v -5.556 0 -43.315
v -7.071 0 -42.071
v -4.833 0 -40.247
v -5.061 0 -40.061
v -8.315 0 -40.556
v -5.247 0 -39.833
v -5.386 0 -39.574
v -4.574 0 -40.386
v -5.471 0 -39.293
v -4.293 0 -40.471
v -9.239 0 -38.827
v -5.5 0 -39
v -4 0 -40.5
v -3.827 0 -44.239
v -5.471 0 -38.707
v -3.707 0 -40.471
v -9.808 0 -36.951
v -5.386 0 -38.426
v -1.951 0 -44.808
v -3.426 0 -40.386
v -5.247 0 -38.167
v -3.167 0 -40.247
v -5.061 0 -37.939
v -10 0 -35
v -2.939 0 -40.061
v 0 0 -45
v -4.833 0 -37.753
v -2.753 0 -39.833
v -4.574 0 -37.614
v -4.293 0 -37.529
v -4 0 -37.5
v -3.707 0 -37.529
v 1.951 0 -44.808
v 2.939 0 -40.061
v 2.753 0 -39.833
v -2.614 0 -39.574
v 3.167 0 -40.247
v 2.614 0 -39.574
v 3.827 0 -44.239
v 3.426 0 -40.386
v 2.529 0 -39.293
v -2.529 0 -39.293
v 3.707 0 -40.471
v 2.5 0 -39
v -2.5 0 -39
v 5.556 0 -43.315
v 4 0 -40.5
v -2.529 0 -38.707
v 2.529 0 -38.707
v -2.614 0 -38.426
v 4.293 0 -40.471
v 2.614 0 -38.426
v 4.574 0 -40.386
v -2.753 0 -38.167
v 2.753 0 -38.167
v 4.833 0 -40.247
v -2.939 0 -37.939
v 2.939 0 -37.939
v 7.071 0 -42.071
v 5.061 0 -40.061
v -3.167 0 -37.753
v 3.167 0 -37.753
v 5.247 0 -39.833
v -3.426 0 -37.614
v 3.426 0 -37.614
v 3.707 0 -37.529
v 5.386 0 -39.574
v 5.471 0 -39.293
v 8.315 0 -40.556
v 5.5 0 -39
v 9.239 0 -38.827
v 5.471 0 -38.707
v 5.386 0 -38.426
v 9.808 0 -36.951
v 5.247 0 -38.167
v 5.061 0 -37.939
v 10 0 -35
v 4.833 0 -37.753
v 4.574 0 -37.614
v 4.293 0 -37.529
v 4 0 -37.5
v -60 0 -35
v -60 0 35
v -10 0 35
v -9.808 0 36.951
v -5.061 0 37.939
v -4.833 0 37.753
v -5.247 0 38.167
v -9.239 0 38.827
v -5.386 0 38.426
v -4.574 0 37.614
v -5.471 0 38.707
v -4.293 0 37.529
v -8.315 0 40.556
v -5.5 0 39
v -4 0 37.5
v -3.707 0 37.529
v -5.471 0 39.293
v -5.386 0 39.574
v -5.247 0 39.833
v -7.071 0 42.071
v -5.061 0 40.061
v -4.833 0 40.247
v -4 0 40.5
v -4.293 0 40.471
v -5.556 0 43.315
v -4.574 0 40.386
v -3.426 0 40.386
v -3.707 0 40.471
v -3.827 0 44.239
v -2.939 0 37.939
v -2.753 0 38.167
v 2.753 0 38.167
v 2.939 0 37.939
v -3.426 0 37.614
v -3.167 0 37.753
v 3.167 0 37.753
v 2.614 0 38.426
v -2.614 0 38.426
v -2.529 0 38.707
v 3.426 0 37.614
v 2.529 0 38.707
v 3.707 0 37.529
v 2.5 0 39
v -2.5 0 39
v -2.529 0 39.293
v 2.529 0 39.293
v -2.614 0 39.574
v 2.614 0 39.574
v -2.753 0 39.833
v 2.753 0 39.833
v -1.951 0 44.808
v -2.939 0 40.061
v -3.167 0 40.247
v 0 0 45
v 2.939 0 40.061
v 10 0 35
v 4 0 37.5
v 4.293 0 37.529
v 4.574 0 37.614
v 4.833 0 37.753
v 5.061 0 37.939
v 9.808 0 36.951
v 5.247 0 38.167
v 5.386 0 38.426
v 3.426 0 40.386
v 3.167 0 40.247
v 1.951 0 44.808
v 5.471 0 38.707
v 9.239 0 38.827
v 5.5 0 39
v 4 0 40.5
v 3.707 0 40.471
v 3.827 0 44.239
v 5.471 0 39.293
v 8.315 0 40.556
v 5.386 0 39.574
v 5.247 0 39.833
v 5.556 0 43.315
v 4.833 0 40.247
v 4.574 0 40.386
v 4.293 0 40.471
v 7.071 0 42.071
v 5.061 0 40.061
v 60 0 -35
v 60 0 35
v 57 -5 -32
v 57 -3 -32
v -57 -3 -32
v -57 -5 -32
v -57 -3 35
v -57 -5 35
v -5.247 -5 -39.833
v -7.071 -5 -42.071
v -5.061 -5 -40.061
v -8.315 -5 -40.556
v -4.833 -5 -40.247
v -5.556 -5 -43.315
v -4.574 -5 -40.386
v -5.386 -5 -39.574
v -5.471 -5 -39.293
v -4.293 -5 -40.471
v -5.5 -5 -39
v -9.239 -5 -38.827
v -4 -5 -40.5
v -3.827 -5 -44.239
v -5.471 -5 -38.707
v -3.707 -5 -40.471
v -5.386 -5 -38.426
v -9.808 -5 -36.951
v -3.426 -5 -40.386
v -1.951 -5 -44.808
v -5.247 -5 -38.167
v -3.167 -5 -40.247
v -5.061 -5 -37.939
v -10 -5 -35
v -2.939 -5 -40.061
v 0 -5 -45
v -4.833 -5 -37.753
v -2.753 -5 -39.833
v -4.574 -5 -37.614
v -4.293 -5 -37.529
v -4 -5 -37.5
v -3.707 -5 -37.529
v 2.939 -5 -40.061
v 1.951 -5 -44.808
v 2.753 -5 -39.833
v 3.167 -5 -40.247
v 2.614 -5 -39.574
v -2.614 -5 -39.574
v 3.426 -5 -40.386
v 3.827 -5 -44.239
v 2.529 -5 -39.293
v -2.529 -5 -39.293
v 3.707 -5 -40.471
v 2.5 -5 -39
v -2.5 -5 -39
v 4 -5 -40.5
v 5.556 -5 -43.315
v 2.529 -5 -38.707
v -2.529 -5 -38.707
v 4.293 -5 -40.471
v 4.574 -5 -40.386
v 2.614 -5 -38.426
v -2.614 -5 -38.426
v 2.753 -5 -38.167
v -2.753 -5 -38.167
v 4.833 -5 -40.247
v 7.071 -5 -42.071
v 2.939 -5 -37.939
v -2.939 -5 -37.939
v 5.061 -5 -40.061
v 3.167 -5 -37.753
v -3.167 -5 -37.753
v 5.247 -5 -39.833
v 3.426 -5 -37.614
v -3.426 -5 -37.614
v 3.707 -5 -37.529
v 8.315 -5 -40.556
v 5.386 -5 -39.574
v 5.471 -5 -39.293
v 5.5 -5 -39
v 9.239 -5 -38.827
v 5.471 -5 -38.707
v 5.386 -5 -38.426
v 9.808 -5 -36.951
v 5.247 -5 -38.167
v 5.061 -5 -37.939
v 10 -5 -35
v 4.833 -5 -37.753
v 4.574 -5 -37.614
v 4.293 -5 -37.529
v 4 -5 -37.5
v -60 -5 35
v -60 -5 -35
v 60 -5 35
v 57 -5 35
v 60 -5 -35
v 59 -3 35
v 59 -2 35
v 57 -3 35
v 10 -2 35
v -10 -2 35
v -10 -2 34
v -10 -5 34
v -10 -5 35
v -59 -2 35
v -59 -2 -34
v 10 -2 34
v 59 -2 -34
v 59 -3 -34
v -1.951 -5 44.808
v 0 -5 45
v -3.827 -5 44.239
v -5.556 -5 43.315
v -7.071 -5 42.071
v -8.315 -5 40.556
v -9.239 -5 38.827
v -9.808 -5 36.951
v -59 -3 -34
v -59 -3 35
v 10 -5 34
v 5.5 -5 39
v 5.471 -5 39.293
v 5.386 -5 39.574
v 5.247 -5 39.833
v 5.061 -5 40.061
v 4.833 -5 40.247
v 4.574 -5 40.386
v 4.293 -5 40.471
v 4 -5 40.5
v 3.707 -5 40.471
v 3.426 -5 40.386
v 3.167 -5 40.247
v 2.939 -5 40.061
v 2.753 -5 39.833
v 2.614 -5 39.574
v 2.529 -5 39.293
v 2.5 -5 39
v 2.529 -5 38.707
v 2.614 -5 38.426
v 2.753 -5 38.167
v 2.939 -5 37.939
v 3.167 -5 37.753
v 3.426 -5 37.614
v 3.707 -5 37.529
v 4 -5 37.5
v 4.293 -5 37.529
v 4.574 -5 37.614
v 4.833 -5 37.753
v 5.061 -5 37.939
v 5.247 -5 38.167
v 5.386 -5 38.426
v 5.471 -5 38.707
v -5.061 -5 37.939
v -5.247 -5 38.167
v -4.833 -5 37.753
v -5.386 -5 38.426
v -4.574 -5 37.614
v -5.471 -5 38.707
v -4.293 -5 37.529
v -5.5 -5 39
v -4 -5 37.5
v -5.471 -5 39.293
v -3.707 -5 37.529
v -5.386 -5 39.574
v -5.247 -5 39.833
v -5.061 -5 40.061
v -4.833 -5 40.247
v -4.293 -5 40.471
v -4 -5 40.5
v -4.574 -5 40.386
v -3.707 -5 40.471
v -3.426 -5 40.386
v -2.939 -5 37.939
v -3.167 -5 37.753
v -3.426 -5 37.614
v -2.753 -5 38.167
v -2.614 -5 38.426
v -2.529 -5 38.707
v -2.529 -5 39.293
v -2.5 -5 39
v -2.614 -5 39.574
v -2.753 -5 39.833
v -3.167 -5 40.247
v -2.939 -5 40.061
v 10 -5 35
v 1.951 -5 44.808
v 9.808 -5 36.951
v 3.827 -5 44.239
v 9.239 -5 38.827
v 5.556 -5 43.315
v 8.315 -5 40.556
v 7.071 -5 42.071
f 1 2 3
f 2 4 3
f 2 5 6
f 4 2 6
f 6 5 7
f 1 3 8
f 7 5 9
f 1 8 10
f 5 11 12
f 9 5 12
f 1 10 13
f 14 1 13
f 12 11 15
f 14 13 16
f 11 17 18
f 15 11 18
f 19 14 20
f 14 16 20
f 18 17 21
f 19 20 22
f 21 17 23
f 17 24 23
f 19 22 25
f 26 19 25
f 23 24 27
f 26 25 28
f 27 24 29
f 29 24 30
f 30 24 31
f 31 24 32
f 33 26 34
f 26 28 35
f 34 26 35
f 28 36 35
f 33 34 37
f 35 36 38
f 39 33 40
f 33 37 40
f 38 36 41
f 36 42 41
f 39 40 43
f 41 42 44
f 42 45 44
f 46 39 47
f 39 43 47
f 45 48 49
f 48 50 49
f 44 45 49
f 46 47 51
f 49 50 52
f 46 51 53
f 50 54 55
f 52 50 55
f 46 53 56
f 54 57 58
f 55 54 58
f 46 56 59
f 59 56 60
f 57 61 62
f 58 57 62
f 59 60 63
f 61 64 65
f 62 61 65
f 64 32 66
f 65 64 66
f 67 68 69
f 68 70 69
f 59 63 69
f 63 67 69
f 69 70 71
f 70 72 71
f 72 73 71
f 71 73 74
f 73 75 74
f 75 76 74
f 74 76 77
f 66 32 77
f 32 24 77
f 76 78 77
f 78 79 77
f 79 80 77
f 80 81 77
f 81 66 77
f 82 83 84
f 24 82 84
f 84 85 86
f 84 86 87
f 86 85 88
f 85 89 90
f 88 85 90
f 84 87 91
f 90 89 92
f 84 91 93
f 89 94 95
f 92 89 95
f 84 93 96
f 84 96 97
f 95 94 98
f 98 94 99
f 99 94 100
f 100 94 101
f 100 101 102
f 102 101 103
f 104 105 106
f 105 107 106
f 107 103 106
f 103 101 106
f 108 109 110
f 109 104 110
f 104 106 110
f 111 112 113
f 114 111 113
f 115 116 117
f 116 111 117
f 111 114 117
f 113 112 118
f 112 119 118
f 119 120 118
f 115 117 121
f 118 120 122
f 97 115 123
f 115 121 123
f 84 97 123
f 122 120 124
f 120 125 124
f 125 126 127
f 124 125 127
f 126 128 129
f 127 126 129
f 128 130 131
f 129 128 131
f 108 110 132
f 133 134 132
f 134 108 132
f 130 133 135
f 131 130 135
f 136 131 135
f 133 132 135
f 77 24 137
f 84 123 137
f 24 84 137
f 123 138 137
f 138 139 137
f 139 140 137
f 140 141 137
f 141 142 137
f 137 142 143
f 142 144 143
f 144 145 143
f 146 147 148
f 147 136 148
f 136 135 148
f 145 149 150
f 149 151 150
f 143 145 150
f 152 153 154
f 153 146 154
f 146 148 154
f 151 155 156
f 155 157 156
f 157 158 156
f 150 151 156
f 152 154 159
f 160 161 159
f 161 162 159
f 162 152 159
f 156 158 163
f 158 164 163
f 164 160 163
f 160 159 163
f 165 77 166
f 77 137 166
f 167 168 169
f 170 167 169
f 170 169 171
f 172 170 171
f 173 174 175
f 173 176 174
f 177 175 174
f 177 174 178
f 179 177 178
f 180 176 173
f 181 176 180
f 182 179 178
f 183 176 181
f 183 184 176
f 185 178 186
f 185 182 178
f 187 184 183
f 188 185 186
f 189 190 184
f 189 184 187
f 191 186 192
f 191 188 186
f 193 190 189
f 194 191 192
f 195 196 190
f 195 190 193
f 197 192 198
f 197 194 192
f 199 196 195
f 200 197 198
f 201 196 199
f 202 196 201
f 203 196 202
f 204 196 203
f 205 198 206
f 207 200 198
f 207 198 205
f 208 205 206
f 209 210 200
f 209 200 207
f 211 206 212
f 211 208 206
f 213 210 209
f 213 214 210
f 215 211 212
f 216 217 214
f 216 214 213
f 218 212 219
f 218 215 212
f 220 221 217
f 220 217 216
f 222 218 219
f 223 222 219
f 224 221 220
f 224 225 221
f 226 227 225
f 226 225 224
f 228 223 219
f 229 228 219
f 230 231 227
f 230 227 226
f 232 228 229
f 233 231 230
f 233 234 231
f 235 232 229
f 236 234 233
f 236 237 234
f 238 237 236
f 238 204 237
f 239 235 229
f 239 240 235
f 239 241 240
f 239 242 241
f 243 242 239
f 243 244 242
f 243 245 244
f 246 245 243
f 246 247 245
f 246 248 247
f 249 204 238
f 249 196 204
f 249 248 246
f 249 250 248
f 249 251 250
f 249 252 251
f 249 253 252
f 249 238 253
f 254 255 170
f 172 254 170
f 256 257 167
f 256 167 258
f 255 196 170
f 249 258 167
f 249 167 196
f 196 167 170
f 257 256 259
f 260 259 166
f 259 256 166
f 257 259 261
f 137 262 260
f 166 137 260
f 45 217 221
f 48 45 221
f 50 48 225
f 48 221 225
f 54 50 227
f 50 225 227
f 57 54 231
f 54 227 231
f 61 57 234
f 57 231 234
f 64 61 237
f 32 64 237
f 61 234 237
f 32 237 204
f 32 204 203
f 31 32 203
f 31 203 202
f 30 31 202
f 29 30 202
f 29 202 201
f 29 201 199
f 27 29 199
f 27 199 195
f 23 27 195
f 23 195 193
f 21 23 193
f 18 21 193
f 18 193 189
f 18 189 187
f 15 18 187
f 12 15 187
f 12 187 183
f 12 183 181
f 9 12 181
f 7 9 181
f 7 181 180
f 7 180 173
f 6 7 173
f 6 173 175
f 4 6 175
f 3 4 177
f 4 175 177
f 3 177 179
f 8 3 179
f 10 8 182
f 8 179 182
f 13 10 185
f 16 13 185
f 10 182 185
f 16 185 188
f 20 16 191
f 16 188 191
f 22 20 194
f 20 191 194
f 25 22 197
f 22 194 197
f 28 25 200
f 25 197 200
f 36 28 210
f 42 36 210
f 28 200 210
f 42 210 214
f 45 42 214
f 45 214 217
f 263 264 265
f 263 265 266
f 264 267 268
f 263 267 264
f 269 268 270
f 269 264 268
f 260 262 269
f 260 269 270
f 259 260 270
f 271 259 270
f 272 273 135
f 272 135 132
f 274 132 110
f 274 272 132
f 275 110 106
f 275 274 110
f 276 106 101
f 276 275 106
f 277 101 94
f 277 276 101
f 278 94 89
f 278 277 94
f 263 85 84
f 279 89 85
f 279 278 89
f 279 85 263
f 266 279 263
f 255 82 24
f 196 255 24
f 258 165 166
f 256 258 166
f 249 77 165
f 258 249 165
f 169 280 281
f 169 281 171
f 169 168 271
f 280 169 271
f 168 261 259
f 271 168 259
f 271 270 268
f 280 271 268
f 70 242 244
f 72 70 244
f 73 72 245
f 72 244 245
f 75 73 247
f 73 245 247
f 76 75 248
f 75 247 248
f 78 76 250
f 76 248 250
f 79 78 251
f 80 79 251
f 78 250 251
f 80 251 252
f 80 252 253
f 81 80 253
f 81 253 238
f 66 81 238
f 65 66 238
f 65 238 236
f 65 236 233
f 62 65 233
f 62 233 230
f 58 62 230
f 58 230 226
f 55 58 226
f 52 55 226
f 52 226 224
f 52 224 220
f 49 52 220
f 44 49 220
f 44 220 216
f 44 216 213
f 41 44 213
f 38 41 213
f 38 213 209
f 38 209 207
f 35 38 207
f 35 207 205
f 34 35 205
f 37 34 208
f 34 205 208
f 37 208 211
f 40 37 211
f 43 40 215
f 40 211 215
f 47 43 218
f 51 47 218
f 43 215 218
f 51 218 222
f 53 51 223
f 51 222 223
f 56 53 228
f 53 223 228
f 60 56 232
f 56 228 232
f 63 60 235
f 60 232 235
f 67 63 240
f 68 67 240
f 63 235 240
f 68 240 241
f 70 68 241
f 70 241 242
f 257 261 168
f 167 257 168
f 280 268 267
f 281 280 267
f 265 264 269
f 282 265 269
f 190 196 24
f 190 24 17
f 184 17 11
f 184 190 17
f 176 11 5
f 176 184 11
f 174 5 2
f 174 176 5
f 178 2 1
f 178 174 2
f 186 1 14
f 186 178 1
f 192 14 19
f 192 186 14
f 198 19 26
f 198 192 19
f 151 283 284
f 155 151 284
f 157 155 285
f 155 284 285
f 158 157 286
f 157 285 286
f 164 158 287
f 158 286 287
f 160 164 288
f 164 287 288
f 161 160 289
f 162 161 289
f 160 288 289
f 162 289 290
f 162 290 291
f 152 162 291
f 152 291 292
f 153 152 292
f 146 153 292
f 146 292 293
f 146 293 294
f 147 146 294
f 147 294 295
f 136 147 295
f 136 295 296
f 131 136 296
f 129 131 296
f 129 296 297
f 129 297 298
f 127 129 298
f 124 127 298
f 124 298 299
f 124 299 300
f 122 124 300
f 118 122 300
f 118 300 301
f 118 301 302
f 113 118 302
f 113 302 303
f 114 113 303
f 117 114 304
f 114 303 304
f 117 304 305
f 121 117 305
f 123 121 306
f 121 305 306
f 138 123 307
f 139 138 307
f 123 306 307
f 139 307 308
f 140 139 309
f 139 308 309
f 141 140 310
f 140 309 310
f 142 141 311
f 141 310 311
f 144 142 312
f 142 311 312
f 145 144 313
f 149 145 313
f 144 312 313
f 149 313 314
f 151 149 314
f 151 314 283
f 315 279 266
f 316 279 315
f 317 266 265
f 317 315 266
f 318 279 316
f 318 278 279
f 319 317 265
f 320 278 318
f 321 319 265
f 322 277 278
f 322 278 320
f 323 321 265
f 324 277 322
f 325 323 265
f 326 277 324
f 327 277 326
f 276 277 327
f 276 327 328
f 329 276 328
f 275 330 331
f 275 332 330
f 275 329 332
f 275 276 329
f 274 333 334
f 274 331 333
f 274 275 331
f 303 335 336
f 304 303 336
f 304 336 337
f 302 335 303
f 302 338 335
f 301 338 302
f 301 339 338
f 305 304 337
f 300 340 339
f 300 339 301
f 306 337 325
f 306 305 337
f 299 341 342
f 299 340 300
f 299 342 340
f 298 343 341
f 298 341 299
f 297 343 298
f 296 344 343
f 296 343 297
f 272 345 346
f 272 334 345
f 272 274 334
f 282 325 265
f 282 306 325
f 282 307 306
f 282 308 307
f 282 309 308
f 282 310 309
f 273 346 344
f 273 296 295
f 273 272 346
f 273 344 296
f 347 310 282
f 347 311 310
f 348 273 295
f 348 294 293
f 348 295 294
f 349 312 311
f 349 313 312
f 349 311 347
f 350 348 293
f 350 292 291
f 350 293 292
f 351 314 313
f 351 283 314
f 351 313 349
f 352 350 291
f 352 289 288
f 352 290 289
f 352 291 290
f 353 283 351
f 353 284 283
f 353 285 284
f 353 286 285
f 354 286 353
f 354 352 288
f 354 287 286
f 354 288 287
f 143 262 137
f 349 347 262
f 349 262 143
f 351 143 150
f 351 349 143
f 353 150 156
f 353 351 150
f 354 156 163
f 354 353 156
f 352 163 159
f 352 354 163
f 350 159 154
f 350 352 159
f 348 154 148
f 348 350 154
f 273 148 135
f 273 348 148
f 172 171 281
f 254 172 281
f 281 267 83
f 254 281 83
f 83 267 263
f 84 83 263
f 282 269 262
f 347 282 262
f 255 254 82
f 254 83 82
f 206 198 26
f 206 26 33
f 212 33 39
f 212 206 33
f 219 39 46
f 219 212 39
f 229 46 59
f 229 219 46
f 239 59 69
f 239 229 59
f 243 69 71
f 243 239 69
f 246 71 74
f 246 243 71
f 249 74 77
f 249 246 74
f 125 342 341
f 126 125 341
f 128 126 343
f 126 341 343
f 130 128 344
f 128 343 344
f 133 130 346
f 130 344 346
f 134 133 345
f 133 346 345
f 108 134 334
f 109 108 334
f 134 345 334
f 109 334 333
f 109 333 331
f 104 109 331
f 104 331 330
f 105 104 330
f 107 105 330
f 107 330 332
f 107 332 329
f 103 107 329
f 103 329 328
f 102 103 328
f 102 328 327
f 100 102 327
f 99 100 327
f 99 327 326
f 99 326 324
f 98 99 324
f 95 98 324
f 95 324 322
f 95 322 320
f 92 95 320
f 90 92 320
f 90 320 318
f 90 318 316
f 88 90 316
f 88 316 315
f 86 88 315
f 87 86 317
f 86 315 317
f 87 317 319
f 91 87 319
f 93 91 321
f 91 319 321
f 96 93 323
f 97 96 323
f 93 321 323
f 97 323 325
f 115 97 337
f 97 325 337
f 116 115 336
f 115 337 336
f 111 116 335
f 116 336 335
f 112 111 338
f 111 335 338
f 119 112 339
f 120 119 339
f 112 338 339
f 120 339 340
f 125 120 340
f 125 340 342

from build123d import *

# Parameters (mm, degrees)
F0_W      = 120
F0_H      = 70
F1_DEPTH  = 2
F3_DEPTH  = 1
F5_DEPTH  = 2
F6_W      = 20
F6_H      = 1
F7_DEPTH  = 3
F9_DEPTH  = 5
F11_DEPTH = 5
F12_R     = 1.5
F13_DEPTH = 5.001


# Not quite as in the source:
# - a feature names something its author has since deleted; it is built from what else it names


with BuildPart() as f1:
    # F0 (on Front) → F1 (new body)
    with BuildSketch(Plane.XZ):
        Rectangle(F0_W, F0_H)
    extrude(amount=F1_DEPTH)

    # F2 (on face) → F3 (join)
    with BuildSketch(Plane.XZ.offset(2)):
        Polygon((-59, -34), (-59, 35), (-60, 35), (-60, -35), (60, -35), (60, 35), (59, 35), (59, -34), align=None)
    extrude(amount=F3_DEPTH)

    # F4 (on face) → F5 (join)
    with BuildSketch(Plane.XZ.offset(3)):
        Polygon((-57, 35), (-60, 35), (-60, -35), (60, -35), (60, 35), (57, 35), (57, -32), (-57, -32), align=None)
    extrude(amount=F5_DEPTH)

    # F6 (on face) → F7 (join)
    with BuildSketch(Plane.XZ.offset(2)):
        with Locations((0, 34.5)):
            Rectangle(F6_W, F6_H)
    extrude(amount=F7_DEPTH)

    # F8 (on face) → F9 (join)
    with BuildSketch(Plane.XZ.offset(5)):
        with BuildLine():
            ThreePointArc((0, 45), (-7.0710678119, 42.0710678119), (-10, 35))
            Line((-10, 35), (10, 35))
            ThreePointArc((10, 35), (7.0710678119, 42.0710678119), (0, 45))
        make_face()
    extrude(amount=-F9_DEPTH)

    # F10 (on face) → F11 (join)
    with BuildSketch(Plane.XZ.offset(5)):
        with BuildLine():
            Line((10, -35), (-10, -35))
            ThreePointArc((-10, -35), (-7.0710678119, -42.0710678119), (0, -45))
            ThreePointArc((0, -45), (7.0710678119, -42.0710678119), (10, -35))
        make_face()
    extrude(amount=-F11_DEPTH)

    # F12 (on face) → F13 (cut, through all)
    with BuildSketch(Plane.XZ.offset(5)):
        with Locations((-4, -39)):
            Circle(F12_R)
        with Locations((4, -39)):
            Circle(F12_R)
        with Locations((-4, 39)):
            Circle(F12_R)
        with Locations((4, 39)):
            Circle(F12_R)
    extrude(amount=-F13_DEPTH, mode=Mode.SUBTRACT)


solid = f1.part
